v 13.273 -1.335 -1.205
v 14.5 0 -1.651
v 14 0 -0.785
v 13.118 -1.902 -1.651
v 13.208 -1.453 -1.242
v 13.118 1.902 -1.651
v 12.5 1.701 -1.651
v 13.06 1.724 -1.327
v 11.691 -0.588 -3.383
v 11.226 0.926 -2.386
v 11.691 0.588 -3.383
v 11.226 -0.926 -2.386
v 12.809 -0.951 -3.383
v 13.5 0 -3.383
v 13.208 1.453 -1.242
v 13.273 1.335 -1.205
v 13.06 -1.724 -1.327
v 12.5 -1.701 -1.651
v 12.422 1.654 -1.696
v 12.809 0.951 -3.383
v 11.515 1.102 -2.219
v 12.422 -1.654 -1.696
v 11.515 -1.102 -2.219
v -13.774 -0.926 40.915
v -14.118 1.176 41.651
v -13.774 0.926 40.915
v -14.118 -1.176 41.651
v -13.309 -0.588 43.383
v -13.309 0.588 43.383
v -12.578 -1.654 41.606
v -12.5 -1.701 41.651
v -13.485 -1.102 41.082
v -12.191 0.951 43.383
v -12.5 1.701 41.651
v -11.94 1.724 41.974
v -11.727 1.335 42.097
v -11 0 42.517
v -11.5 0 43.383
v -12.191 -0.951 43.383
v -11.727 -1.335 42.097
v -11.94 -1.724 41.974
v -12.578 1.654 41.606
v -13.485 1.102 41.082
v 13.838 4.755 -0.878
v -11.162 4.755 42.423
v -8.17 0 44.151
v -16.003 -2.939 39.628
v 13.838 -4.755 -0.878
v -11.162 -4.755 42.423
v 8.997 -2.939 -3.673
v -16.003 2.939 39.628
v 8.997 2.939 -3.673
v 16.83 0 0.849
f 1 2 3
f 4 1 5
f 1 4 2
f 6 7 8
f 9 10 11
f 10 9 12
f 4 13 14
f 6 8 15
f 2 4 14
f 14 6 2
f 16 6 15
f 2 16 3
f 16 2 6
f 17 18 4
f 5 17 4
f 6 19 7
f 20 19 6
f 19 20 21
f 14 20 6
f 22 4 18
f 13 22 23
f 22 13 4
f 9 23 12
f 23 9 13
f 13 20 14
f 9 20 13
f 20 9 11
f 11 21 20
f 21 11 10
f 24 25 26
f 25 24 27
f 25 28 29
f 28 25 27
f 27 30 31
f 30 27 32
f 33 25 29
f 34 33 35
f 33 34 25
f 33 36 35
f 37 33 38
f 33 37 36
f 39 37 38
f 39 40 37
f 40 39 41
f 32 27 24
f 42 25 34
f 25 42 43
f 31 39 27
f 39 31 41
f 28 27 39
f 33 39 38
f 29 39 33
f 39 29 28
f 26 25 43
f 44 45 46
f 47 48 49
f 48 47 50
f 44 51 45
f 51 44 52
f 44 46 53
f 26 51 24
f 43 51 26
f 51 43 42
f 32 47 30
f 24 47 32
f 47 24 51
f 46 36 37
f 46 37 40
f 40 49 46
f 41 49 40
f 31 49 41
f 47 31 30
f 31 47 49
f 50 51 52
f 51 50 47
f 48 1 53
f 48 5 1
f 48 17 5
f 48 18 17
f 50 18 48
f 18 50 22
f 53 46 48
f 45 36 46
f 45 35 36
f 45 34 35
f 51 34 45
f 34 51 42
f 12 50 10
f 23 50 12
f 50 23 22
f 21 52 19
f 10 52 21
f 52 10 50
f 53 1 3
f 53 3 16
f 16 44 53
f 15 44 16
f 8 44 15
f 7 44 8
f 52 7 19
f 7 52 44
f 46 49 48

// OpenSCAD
$fn=5;
union()
{
	translate([12.5,0,-1.6506348])
	{
		rotate(30.000006,[0,-1,0])
		{
			cylinder(h=50,d=10);
		}
	}
	color([1,0,0])
	{
		union()
		{
			translate([12.5,0,-1.6506348])
			{
				rotate(0,[0,0,1])
				{
					sphere(d=4);
				}
			}
			translate([0,0,20])
			{
				rotate(0,[0,0,1])
				{
					sphere(d=4);
				}
			}
			translate([-12.5,0,41.650635])
			{
				rotate(0,[0,0,1])
				{
					sphere(d=4);
				}
			}
		}
	}
}
